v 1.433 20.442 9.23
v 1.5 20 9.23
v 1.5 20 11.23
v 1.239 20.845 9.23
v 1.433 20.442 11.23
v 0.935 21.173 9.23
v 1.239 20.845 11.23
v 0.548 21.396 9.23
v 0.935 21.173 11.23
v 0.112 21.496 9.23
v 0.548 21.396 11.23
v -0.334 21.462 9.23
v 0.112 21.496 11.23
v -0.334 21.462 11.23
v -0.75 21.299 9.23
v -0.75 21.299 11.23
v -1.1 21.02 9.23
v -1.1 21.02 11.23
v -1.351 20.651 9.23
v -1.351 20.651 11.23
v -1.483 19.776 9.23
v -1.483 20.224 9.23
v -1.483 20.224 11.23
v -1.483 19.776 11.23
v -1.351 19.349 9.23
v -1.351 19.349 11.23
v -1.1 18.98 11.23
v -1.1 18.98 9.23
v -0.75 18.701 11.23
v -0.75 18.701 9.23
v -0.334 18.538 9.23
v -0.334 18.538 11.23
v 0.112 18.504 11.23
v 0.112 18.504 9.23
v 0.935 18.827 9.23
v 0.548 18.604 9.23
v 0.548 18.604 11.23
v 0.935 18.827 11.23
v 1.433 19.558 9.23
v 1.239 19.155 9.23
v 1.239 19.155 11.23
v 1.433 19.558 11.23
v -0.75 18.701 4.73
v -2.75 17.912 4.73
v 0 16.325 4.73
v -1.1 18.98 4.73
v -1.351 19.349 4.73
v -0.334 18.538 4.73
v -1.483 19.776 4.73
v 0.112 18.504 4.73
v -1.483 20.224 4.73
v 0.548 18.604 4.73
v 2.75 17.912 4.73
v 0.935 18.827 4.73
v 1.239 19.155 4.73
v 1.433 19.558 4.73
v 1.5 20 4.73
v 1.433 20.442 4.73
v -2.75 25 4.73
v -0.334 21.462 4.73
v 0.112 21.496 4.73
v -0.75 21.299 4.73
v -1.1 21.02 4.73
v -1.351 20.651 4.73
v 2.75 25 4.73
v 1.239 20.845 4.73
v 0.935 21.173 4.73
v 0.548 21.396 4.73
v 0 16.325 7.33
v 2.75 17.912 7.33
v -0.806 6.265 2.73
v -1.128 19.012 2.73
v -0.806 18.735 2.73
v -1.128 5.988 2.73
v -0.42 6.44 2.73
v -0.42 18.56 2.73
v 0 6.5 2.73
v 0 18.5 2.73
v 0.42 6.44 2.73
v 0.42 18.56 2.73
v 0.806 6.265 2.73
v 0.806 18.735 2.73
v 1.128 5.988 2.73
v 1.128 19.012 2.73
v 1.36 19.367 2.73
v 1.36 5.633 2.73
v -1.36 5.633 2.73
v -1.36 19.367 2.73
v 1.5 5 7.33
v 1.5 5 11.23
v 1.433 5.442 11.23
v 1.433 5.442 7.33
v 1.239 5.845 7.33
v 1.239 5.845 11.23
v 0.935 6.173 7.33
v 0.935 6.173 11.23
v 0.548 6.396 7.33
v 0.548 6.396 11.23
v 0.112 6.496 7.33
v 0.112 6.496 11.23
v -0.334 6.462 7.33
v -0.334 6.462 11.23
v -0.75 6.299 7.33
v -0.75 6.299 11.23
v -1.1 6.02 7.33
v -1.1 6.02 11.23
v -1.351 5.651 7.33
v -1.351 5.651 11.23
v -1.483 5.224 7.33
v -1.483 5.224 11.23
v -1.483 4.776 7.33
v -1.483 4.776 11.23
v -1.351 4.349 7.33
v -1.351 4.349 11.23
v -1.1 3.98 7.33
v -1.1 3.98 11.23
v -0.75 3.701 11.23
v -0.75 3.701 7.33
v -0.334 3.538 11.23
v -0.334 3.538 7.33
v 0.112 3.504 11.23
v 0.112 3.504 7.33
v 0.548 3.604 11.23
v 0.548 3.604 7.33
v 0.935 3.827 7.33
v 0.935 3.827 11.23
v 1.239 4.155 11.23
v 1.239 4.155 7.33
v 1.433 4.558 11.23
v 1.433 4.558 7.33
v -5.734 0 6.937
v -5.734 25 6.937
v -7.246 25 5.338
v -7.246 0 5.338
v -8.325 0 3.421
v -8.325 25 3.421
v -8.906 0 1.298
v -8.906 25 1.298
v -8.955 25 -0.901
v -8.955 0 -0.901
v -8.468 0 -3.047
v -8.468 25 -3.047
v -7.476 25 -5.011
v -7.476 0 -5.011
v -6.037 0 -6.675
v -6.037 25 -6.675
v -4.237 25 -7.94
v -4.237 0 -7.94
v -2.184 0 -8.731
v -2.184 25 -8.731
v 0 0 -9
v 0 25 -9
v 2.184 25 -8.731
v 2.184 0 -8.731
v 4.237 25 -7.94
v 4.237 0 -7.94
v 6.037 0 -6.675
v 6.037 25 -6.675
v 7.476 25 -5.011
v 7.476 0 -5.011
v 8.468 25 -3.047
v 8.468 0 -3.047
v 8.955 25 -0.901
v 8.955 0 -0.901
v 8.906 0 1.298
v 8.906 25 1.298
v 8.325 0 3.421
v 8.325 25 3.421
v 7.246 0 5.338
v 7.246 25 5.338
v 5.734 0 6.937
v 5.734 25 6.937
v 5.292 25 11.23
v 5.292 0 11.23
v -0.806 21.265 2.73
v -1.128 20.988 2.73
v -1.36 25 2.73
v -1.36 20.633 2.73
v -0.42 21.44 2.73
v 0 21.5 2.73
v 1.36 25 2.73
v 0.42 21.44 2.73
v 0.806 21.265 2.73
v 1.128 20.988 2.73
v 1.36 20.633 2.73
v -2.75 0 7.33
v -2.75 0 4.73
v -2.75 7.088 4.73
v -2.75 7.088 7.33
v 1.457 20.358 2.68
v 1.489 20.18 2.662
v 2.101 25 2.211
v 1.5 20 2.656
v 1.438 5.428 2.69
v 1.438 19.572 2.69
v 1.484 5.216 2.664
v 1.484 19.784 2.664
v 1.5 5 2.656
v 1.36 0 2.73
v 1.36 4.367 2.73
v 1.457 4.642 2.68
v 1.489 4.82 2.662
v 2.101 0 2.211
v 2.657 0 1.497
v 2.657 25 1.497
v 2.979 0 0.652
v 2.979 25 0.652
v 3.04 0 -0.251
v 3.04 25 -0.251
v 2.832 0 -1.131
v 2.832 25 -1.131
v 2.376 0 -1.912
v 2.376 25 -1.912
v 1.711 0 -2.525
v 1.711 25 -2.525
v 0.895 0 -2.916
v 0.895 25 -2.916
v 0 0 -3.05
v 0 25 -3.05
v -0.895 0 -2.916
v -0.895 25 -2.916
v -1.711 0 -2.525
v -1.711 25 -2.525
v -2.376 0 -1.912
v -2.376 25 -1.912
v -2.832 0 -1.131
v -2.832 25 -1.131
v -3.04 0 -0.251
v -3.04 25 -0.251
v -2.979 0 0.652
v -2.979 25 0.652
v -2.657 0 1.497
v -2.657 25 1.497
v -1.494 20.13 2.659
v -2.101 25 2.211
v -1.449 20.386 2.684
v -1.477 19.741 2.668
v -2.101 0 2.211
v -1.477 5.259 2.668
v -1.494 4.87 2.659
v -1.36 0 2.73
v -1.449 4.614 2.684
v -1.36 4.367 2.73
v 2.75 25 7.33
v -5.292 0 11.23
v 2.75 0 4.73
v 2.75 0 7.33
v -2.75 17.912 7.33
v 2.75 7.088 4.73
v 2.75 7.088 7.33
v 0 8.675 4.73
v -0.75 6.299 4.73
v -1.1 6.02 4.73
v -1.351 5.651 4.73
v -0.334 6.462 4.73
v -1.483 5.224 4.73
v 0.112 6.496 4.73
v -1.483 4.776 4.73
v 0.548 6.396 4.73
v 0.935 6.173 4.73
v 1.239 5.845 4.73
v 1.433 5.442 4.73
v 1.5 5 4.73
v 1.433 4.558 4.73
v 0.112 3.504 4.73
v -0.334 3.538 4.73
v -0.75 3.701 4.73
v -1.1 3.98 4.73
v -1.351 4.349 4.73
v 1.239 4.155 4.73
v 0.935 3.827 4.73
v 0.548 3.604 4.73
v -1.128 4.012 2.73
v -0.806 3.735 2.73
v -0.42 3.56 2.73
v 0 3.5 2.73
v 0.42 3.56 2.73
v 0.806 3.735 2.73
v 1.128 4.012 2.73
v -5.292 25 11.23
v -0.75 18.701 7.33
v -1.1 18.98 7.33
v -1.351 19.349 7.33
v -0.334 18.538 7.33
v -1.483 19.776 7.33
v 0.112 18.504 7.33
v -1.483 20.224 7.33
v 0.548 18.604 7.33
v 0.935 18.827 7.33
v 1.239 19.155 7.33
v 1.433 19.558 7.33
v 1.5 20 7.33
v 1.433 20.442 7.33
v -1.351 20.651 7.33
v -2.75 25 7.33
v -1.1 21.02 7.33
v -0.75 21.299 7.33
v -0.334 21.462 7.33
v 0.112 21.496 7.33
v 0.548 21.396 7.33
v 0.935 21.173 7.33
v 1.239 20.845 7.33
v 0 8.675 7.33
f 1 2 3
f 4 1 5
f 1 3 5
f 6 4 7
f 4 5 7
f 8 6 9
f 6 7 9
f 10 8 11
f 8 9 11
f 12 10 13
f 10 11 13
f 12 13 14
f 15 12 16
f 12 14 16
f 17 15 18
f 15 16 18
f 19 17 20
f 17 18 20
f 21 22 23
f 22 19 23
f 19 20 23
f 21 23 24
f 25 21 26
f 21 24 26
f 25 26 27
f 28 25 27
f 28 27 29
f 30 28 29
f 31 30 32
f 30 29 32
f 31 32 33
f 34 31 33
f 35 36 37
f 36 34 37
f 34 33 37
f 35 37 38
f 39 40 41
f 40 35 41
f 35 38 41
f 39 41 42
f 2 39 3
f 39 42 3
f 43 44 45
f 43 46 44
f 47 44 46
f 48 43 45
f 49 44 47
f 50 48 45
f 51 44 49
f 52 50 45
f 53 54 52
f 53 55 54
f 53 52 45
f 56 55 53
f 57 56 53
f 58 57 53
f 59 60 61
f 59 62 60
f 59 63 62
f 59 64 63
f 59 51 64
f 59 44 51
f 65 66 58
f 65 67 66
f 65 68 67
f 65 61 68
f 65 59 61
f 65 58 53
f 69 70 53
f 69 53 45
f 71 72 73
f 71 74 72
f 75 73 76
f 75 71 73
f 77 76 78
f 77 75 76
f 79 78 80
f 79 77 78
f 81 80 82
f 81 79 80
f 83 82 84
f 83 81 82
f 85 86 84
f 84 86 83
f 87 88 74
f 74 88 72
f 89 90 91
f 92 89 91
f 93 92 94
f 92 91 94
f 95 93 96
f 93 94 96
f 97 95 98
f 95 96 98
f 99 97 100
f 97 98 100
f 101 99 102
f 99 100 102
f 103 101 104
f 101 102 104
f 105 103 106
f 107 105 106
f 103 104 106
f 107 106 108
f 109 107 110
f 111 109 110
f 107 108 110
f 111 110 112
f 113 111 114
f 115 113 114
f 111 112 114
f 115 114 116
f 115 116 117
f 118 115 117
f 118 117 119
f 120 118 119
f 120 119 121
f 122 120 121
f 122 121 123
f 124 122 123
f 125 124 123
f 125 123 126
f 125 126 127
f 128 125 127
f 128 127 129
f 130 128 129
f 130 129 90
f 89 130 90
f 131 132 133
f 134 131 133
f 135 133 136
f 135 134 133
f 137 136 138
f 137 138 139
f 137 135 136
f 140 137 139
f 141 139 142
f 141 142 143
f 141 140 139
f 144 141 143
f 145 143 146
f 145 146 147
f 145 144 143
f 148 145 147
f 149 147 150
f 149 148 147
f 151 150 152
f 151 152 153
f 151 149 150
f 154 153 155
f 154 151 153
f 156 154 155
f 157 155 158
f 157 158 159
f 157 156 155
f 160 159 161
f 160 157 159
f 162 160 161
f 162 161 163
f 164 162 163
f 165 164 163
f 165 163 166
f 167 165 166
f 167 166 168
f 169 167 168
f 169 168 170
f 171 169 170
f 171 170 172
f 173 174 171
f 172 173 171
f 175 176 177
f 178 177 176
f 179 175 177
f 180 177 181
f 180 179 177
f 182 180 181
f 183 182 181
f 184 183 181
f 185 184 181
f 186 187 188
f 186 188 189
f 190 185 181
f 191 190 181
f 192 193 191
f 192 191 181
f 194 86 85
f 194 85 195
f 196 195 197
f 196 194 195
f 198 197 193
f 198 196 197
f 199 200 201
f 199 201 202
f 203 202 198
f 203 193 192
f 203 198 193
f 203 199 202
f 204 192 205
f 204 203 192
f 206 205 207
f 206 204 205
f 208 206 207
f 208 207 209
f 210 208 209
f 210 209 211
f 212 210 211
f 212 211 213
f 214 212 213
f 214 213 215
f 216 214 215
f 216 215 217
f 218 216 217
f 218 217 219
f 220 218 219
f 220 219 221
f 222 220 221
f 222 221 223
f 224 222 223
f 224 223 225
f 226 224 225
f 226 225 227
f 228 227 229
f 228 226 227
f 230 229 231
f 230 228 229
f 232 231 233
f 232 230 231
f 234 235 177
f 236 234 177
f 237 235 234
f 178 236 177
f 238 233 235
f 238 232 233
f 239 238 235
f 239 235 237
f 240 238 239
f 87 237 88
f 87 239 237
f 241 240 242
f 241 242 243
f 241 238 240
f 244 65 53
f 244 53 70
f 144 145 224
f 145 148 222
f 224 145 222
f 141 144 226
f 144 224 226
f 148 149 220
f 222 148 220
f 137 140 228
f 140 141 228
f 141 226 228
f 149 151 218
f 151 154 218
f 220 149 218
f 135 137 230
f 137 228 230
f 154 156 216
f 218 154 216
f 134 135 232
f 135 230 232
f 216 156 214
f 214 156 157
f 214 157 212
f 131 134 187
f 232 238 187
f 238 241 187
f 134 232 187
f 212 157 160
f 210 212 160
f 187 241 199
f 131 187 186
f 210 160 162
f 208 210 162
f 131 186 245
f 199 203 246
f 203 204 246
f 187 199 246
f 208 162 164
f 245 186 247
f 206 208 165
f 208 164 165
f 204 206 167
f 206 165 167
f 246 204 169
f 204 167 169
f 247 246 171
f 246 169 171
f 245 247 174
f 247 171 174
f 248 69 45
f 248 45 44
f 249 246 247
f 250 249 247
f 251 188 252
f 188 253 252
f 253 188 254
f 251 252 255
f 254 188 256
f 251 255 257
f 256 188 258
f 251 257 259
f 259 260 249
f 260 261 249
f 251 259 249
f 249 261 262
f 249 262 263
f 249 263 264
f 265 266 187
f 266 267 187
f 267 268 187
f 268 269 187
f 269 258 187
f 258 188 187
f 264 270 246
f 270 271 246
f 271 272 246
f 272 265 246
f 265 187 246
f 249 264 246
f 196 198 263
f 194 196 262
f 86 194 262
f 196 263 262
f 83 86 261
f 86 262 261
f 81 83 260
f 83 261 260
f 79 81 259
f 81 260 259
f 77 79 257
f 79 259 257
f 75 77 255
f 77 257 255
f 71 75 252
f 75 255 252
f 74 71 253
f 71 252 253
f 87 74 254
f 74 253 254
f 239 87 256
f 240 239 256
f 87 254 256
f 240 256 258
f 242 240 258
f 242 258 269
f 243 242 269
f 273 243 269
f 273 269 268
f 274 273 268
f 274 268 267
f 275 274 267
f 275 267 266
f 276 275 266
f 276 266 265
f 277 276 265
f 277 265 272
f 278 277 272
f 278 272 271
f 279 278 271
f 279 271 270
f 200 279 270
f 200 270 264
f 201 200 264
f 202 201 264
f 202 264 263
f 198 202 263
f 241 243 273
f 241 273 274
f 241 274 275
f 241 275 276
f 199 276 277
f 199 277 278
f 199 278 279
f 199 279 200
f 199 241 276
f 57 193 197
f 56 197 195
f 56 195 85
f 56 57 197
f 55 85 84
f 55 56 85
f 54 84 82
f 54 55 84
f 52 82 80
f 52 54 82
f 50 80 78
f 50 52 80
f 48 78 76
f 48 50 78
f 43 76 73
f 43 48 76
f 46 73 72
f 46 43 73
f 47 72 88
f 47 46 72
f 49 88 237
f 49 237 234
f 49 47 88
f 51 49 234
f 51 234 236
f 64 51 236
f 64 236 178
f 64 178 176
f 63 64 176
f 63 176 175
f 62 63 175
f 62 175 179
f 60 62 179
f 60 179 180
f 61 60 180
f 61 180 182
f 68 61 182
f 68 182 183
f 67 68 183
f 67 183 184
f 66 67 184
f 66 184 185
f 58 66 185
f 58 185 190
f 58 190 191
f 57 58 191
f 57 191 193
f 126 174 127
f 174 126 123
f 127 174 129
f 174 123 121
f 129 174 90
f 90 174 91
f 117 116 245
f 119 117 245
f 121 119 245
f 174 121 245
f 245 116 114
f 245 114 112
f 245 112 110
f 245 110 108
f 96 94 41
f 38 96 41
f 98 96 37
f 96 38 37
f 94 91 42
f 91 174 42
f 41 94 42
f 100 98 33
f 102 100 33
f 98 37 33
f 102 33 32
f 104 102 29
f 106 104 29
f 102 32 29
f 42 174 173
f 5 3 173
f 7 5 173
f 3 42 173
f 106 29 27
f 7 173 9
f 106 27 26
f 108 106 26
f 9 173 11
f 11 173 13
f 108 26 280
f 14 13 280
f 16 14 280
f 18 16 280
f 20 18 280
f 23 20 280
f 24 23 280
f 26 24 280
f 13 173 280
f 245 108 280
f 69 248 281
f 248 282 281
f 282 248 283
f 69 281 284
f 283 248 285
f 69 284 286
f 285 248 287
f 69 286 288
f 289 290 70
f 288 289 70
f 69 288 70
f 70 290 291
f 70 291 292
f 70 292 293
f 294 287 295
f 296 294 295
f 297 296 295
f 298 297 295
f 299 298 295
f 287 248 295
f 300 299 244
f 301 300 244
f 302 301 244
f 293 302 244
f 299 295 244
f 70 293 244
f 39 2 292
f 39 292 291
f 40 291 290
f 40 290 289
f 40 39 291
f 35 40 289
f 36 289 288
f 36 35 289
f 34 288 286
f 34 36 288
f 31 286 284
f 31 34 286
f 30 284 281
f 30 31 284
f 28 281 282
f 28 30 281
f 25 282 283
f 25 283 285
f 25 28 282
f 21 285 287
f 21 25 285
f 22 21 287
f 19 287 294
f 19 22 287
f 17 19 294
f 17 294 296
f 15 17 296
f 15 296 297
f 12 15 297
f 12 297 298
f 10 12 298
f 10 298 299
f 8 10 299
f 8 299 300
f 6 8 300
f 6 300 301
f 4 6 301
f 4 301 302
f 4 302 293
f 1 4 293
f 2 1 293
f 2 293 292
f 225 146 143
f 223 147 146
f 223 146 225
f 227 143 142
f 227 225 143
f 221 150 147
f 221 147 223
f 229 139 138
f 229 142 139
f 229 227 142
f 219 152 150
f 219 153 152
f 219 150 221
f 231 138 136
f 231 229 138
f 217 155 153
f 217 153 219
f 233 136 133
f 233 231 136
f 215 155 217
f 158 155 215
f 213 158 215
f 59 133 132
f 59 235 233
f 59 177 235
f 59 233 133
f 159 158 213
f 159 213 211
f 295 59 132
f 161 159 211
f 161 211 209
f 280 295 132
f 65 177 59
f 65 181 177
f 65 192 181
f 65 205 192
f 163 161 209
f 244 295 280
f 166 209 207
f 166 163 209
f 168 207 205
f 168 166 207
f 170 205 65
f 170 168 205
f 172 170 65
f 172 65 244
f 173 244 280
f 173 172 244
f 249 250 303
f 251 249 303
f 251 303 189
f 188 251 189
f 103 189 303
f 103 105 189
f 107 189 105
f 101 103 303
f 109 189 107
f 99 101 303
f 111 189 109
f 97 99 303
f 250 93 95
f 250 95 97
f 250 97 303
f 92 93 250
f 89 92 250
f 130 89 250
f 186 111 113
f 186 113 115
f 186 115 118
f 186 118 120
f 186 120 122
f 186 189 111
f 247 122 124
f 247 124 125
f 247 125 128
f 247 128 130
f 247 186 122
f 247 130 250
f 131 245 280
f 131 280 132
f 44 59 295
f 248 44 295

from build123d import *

# Parameters (mm, degrees)
SKETCH_1_R          = 6
SKETCH_1_R_2        = 3.05
EXTRUDE_1_DEPTH     = 25
SKETCH_2_W          = 4.705017592
SKETCH_2_H          = 2
EXTRUDE_2_DEPTH     = 12
SKETCH_4_W          = 10.5
SKETCH_4_H          = 6.5
EXTRUDE_3_DEPTH     = 25
SKETCH_6_R          = 1.5
CUT_EXTRUDE_3_DEPTH = 10
SKETCH_5_W          = 5.5
SKETCH_5_H          = 2.6
CUT_EXTRUDE_4_DEPTH = 5
CUT_EXTRUDE_8_DEPTH = 2.6
EXTRUDE_4_DEPTH     = 25
EXTRUDE_START       = 2
SKETCH_14_W         = 10.5
SKETCH_14_H         = 25
SKETCH_14_R         = 1.5
EXTRUDE_5_DEPTH     = 2
CUT_EXTRUDE_9_DEPTH = 30.391636651


with BuildPart() as part:
    # Эскиз1 → Бобышка-Вытянуть1 (new body)
    with BuildSketch(Plane(origin=(0, 0, 0), x_dir=(1, 0, 0), z_dir=(0, 1, 0))):
        with Locations(Location((0, 0, 0), (0, 0, 270))):
            Circle(SKETCH_1_R)
        with Locations(Location((0, 0, 0), (0, 0, 270))):
            Circle(SKETCH_1_R_2, mode=Mode.SUBTRACT)
    extrude(amount=EXTRUDE_1_DEPTH)

    # Эскиз2 → Бобышка-Вытянуть2 (add)
    with BuildSketch(Plane.XZ):
        with Locations((0.023466422, 3.73)):
            Rectangle(SKETCH_2_W, SKETCH_2_H)
    extrude(amount=-EXTRUDE_2_DEPTH)

    # Эскиз4 → Бобышка-Вытянуть3 (add, through all)
    with BuildSketch(Plane.XZ):
        with Locations((0, 5.98)):
            Rectangle(SKETCH_4_W, SKETCH_4_H)
    extrude(amount=-EXTRUDE_3_DEPTH)

    # Эскиз6 → Вырез-Вытянуть3 (cut)
    with BuildSketch(Plane.XY.offset(9.23)):
        with Locations((0, 5)):
            Circle(SKETCH_6_R)
    cut_extrude_3 = extrude(amount=-CUT_EXTRUDE_3_DEPTH, mode=Mode.SUBTRACT)

    # Эскиз5 → Вырез-Вытянуть4 (cut)
    with BuildSketch(Plane.XZ):
        with Locations((0, 6.03)):
            Rectangle(SKETCH_5_W, SKETCH_5_H)
    cut_extrude_4 = extrude(amount=-CUT_EXTRUDE_4_DEPTH, mode=Mode.SUBTRACT)

    # Эскиз11 → Вырез-Вытянуть8 (cut)
    with BuildSketch(Plane(origin=(0, 0, 7.33), x_dir=(-1, 0, 0), z_dir=(0, 0, -1))):
        Polygon((-2.75, 6.58771324), (-2.75, 7.08771324), (0, 8.675426481), (2.75, 7.08771324), (2.75, 6.58771324), (2.75, 3.41228676), (0, 1.824573519), (-2.75, 3.41228676), align=None)
    cut_extrude_8 = extrude(amount=CUT_EXTRUDE_8_DEPTH, mode=Mode.SUBTRACT)

    # Зеркальное отражение1: Вырез-Вытянуть3, Вырез-Вытянуть4, Вырез-Вытянуть8 across plane
    add(cut_extrude_3.mirror(Plane(origin=(0, 12.5, 0), x_dir=(0, 0, 1), z_dir=(0, -1, 0))), mode=Mode.SUBTRACT)
    add(cut_extrude_4.mirror(Plane(origin=(0, 12.5, 0), x_dir=(0, 0, 1), z_dir=(0, -1, 0))), mode=Mode.SUBTRACT)
    add(cut_extrude_8.mirror(Plane(origin=(0, 12.5, 0), x_dir=(0, 0, 1), z_dir=(0, -1, 0))), mode=Mode.SUBTRACT)

    # Эскиз13 → Бобышка-Вытянуть4 (add, through all)
    with BuildSketch(Plane(origin=(0, 25, 0), x_dir=(1, 0, 0), z_dir=(0, 1, 0))):
        with BuildLine():
            Line((-5.25, -2.90473751), (-5.25, -9.23))
            ThreePointArc((-5.25, -9.23), (0, 10.618634564), (5.25, -9.23))
            Line((5.25, -9.23), (5.25, -2.90473751))
            ThreePointArc((5.25, -2.90473751), (0, 6), (-5.25, -2.90473751))
        make_face()
    extrude(amount=-EXTRUDE_4_DEPTH)

    # Эскиз14 → Бобышка-Вытянуть5 (add)
    with BuildSketch(Plane.XY.offset(9.23).offset(EXTRUDE_START)):
        with Locations((0, 12.5)):
            Rectangle(SKETCH_14_W, SKETCH_14_H)
        with Locations((0, 20)):
            Circle(SKETCH_14_R, mode=Mode.SUBTRACT)
        with Locations((0, 5)):
            Circle(SKETCH_14_R, mode=Mode.SUBTRACT)
    extrude(amount=-EXTRUDE_5_DEPTH)

    # Эскиз15 → Вырез-Вытянуть9 (cut, through all)
    with BuildSketch(Plane.XZ):
        with BuildLine():
            Line((-5.25, 9.23), (-5.25, 7.310095759))
            ThreePointArc((-5.25, 7.310095759), (0, -9), (5.25, 7.310095759))
            Line((5.25, 7.310095759), (5.25, 9.23))
            ThreePointArc((5.25, 9.23), (0, -10.618634564), (-5.25, 9.23))
        make_face()
    extrude(amount=-CUT_EXTRUDE_9_DEPTH, mode=Mode.SUBTRACT)

    # Фаска1
    # the kernel refuses this chamfer: 4.36872896, 1 mm, written as the material it adds along each edge
    with BuildSketch(Plane(origin=(-5.25, 0, 7.310095759), x_dir=(0.003980651580542702, 0, 0.9999920771751115), z_dir=(0, 1, 0))) as chamfer_1_piece_1_section:
        with BuildLine():
            Line((4.499702082, 0), (-0.54914754, -0.499943041))
            Line((-0.54914754, -0.499943041), (-0.616269571, -0.444006022))
            ThreePointArc((-0.616269571, -0.444006022), (-0.289511406, -0.238197361), (-0.070765054, 0.051250602))
            Line((-0.070765054, 0.051250602), (0.000347808, 0.087373887))
            ThreePointArc((0.000347808, 0.087373887), (2.250163198, 0.078418085), (4.50004989, 0.087373887))
            Line((4.50004989, 0.087373887), (4.499702082, 0))
        make_face()
    chamfer_1_piece_1 = extrude(amount=25, mode=Mode.PRIVATE)
    chamfer_1_piece_1 = split(chamfer_1_piece_1, bisect_by=Plane(origin=(-5.368726711, 12.5, 11.23), z_dir=(0, 0, -1)), keep=Keep.TOP, mode=Mode.PRIVATE)
    add(chamfer_1_piece_1)

    # Фаска2
    # the kernel refuses this chamfer: 4.36872896, 1 mm, written as the material it adds along each edge
    with BuildSketch(Plane(origin=(5.25, 0, 7.310095759), x_dir=(-0.0039806515805427085, 0, 0.9999920771751115), z_dir=(0, 1, 0))) as chamfer_2_piece_1_section:
        with BuildLine():
            Line((4.499702082, 0), (-0.54914754, 0.499943041))
            Line((-0.54914754, 0.499943041), (-0.616269571, 0.444006022))
            ThreePointArc((-0.616269571, 0.444006022), (-0.289511406, 0.238197361), (-0.070765054, -0.051250602))
            Line((-0.070765054, -0.051250602), (0.000347808, -0.087373887))
            ThreePointArc((0.000347808, -0.087373887), (2.250163198, -0.078418085), (4.50004989, -0.087373887))
            Line((4.50004989, -0.087373887), (4.499702082, 0))
        make_face()
    chamfer_2_piece_1 = extrude(amount=25, mode=Mode.PRIVATE)
    chamfer_2_piece_1 = split(chamfer_2_piece_1, bisect_by=Plane(origin=(5.368726711, 12.5, 11.23), z_dir=(0, 0, -1)), keep=Keep.TOP, mode=Mode.PRIVATE)
    add(chamfer_2_piece_1)


solid = part.part
